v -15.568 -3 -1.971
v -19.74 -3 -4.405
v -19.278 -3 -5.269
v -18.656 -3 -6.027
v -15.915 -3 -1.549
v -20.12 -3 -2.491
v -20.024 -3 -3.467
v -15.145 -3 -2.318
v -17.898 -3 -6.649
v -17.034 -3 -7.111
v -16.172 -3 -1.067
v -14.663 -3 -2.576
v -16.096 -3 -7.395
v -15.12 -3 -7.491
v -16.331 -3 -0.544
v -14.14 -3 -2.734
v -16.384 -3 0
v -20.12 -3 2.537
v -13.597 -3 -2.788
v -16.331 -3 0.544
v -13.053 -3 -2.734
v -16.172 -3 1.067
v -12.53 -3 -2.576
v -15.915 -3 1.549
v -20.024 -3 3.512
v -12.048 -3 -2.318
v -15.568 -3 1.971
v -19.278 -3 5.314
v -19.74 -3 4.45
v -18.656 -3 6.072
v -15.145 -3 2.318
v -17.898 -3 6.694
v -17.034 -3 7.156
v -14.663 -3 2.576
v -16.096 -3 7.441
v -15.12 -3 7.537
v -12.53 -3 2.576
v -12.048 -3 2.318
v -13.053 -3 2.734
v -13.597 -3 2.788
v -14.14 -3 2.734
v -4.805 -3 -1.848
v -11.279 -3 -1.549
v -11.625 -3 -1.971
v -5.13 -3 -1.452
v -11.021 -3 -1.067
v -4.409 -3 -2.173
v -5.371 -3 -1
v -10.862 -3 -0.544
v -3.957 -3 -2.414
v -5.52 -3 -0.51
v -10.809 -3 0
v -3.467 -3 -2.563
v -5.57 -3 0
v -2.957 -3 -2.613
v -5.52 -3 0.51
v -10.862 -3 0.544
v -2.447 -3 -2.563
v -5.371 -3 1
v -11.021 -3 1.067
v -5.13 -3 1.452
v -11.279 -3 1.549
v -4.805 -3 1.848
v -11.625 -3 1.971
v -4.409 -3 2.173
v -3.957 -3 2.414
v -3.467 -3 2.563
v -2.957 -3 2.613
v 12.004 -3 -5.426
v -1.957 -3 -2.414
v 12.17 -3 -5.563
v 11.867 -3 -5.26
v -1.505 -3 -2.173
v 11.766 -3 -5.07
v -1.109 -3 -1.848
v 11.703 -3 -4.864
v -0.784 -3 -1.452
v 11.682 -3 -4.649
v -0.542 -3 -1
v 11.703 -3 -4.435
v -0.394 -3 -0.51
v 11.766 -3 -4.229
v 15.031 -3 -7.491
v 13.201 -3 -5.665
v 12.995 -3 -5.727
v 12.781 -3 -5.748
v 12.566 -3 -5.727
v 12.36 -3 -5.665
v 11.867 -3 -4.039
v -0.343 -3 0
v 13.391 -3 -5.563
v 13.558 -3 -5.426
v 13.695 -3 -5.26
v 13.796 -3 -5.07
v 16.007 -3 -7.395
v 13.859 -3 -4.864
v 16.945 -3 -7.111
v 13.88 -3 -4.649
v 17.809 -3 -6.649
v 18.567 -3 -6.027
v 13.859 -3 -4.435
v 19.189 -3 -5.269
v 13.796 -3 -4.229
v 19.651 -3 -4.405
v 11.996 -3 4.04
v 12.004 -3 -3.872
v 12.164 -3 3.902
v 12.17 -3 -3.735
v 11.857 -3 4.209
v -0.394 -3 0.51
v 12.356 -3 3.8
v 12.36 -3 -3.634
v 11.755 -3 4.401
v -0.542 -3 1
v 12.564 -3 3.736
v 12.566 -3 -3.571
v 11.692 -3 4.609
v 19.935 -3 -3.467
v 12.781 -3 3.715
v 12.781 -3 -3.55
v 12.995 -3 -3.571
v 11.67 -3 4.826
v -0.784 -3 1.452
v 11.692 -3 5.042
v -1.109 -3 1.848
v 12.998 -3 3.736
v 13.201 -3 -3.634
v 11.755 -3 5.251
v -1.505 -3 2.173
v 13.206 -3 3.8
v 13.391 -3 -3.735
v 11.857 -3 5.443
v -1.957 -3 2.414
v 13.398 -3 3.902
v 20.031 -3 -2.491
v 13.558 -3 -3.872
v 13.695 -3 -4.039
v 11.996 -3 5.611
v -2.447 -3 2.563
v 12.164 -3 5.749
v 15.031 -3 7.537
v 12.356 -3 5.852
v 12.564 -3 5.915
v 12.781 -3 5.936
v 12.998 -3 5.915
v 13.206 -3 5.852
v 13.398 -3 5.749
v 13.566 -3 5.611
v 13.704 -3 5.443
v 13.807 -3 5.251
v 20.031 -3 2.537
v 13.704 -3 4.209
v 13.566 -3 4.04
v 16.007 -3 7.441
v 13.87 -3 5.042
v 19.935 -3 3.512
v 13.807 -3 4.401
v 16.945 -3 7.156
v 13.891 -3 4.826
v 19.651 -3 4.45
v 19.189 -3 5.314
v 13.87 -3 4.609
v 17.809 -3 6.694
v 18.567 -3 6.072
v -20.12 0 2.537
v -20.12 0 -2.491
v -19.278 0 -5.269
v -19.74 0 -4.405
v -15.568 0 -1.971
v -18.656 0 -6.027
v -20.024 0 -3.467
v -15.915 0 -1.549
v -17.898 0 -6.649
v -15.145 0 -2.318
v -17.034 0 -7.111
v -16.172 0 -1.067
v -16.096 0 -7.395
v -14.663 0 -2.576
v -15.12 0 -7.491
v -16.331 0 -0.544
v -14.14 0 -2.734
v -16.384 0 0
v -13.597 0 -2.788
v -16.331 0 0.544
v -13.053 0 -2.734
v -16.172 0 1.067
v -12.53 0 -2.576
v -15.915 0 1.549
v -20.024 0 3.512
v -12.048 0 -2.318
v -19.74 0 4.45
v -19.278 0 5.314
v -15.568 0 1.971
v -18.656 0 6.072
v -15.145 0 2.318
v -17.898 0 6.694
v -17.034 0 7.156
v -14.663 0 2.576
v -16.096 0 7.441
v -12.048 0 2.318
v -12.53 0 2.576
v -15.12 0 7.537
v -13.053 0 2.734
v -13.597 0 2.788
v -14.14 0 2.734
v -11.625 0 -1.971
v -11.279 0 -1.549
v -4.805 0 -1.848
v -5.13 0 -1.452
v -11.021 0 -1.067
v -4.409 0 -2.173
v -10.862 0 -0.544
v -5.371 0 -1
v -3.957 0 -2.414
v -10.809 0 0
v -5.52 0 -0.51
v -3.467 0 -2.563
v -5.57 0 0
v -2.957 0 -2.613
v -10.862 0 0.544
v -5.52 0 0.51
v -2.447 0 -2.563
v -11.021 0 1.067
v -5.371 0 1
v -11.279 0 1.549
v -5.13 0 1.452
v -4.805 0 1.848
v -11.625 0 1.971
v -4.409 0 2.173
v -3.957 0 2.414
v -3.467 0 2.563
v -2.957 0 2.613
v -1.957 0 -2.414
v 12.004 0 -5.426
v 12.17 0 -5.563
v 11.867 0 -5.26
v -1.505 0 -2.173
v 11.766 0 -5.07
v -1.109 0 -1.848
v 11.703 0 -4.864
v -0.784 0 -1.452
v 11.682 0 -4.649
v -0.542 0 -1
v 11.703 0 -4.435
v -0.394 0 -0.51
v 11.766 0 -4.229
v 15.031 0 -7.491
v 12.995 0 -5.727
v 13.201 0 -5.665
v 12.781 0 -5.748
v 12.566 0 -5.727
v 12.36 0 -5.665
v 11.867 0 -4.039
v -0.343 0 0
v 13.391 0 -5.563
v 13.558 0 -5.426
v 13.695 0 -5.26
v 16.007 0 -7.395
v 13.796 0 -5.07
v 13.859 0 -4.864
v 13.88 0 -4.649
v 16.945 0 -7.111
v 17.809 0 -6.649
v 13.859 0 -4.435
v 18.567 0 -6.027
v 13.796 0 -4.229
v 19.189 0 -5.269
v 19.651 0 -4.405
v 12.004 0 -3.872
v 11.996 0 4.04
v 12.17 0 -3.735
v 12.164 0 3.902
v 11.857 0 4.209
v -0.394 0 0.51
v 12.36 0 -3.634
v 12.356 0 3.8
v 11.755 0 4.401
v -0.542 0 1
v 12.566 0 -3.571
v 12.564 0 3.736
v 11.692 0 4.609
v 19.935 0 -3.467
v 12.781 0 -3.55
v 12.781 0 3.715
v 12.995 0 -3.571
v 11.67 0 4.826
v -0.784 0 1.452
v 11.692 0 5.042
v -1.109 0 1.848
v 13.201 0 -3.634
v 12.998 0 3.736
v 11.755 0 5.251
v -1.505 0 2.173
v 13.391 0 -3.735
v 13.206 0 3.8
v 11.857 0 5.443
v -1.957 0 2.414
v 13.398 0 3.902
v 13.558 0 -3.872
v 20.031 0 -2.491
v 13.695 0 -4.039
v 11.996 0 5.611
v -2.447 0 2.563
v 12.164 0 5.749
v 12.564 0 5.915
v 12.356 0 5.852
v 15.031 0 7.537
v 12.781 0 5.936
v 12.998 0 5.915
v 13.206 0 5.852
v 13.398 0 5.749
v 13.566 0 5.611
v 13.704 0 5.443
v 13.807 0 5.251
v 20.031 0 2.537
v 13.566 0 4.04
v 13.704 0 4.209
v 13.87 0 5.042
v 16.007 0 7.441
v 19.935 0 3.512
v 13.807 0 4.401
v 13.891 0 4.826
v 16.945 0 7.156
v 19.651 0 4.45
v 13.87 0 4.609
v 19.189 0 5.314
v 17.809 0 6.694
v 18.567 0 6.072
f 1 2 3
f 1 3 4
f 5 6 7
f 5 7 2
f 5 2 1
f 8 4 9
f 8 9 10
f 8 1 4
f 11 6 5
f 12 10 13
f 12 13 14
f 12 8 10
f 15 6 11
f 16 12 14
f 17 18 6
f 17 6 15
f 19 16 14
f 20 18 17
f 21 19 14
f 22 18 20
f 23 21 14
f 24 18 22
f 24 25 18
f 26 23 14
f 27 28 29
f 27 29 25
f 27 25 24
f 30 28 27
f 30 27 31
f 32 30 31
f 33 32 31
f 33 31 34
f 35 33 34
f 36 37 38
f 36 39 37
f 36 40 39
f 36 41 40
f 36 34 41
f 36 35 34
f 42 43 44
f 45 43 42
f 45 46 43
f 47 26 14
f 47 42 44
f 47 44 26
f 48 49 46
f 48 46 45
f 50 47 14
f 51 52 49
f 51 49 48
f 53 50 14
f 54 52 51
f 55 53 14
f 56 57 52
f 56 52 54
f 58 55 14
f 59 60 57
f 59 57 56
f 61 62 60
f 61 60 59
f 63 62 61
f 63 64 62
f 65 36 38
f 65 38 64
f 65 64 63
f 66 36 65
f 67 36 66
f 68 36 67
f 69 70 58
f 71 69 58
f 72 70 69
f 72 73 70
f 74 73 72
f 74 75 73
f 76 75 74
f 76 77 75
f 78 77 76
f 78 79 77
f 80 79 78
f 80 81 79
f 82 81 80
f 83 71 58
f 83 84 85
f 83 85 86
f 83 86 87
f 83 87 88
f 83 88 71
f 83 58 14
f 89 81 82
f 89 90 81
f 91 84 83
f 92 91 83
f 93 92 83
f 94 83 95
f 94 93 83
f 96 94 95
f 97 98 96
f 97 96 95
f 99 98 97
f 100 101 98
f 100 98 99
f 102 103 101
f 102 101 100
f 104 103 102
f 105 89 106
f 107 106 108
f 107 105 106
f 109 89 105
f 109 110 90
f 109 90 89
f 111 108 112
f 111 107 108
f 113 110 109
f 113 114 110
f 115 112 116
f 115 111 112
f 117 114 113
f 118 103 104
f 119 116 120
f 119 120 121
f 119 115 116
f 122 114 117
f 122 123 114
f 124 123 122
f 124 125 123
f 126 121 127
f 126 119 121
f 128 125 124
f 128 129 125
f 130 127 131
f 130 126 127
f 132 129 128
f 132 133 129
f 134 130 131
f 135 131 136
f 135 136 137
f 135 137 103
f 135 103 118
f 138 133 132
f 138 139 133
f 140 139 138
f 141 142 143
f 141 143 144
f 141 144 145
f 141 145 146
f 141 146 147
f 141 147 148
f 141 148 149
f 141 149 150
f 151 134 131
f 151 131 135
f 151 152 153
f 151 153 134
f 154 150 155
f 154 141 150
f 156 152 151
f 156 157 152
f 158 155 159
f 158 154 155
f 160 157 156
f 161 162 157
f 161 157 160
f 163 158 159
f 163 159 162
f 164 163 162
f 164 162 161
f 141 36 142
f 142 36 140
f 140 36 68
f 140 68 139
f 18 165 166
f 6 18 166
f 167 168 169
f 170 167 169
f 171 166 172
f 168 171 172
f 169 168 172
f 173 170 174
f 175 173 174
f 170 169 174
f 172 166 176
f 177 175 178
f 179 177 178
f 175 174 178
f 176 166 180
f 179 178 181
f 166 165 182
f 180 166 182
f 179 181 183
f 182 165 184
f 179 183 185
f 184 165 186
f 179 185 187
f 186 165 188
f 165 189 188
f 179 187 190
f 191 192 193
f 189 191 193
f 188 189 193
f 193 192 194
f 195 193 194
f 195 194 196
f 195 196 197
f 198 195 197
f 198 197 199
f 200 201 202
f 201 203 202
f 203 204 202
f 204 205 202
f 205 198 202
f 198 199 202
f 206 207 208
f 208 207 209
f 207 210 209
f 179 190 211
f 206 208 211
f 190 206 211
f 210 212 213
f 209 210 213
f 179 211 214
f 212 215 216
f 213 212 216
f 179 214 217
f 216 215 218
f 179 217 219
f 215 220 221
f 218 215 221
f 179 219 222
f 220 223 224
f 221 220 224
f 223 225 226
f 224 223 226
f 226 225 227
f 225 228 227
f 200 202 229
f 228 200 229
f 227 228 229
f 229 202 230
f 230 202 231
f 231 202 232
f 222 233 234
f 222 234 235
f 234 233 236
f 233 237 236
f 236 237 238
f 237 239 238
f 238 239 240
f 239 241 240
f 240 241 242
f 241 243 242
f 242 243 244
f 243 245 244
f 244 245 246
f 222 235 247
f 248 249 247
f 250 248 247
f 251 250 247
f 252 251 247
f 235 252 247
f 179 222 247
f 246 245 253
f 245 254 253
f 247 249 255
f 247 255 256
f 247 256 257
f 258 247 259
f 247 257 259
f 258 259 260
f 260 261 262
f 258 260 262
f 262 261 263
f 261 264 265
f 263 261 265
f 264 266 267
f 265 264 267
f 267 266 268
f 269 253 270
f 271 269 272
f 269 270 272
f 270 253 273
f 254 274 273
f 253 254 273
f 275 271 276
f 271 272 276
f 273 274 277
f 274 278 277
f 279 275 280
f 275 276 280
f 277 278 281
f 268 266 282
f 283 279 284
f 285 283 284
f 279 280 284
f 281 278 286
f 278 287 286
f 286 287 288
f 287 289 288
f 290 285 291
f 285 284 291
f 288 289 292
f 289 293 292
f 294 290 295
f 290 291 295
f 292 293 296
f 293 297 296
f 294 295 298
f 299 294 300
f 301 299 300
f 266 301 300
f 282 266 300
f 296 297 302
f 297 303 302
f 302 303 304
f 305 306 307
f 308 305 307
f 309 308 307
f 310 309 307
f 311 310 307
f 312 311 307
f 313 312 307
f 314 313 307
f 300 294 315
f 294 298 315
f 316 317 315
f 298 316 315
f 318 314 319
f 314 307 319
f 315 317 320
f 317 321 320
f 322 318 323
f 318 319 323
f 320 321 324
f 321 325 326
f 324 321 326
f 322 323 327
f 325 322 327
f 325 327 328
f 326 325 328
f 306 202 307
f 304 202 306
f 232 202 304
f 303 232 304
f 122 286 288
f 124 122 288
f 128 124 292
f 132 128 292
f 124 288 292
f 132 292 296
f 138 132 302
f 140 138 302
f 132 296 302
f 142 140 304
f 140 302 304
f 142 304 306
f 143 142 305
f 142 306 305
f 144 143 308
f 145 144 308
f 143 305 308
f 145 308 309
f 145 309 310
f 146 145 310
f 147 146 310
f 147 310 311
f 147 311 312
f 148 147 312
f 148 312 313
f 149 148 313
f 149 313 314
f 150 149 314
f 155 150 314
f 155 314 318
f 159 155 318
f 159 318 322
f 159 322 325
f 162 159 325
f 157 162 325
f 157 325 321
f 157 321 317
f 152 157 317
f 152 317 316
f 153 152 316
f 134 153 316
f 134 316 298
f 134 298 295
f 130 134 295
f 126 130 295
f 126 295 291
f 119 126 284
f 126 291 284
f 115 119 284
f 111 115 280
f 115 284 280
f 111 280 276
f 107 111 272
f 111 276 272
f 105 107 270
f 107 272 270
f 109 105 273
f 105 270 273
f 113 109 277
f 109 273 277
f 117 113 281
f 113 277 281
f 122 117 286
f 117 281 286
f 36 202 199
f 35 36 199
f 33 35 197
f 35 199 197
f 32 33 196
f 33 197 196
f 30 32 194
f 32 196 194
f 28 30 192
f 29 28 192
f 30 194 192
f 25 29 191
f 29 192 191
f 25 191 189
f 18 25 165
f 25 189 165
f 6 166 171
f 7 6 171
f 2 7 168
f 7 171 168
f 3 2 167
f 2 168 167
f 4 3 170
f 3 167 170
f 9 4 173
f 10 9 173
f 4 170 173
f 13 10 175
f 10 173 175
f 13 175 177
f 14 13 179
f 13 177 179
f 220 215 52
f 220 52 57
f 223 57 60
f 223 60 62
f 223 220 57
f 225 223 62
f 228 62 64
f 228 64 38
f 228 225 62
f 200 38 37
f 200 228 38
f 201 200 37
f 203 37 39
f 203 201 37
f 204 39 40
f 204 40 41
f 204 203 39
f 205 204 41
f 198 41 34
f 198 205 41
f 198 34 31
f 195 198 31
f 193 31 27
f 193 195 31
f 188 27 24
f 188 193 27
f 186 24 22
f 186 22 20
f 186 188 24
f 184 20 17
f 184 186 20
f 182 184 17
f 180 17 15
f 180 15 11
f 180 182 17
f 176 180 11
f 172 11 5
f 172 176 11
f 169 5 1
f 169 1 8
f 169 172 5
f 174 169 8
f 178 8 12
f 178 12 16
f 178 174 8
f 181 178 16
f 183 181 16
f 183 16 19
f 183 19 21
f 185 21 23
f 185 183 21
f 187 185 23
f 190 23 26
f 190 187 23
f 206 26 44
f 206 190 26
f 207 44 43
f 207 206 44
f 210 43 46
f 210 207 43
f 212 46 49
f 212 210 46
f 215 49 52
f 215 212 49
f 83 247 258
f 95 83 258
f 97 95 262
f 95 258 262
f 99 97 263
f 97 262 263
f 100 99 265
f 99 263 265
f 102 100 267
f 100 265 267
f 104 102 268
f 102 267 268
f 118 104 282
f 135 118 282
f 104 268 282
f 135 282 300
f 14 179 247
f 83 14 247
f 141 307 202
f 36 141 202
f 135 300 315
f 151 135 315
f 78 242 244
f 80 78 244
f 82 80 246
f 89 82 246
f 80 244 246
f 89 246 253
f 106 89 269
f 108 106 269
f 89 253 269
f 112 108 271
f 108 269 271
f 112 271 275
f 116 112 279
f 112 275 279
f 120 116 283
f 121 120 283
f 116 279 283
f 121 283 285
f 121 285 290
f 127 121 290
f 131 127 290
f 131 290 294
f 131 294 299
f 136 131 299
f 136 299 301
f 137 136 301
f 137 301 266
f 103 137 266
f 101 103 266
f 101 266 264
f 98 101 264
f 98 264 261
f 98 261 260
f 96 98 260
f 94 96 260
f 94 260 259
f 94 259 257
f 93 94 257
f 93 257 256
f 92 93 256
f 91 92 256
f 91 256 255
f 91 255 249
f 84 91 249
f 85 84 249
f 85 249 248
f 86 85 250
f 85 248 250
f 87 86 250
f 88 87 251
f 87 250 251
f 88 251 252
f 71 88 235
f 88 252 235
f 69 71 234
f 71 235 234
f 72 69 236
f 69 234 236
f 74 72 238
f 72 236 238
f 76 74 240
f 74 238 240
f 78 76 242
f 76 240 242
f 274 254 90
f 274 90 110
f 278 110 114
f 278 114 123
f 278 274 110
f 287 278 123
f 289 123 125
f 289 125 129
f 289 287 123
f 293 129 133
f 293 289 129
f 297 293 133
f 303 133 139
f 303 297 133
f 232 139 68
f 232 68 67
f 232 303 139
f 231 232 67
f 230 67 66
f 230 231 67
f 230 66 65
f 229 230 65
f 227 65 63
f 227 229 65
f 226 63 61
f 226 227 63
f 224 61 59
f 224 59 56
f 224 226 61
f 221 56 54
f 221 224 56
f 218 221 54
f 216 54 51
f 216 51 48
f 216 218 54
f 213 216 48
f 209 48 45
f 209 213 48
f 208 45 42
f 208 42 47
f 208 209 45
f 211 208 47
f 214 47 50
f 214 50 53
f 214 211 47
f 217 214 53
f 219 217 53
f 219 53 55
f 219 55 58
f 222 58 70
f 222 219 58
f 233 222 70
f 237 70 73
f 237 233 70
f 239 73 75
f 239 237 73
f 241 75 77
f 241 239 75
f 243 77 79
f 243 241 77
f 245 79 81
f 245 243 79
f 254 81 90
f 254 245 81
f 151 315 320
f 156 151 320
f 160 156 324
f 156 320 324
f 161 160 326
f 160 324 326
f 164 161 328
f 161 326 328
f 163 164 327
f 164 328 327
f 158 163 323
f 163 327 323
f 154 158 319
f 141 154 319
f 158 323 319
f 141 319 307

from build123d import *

# Parameters (mm, degrees)
F0_R     = 2.787797
F0_R_2   = 2.613336
F1_DEPTH = 3
F2_R     = 1.110605
F2_R_2   = 1.099003
F3_DEPTH = 25


with BuildPart() as f1:
    # F0 (on Front) → F1 (new body)
    with BuildSketch(Plane.XZ):
        with BuildLine():
            Line((15.031415, 7.53661), (-15.120215, 7.53661))
            ThreePointArc((-15.120215, 7.53661), (-18.655749, 6.072144), (-20.120215, 2.53661))
            Line((-20.120215, 2.53661), (-20.120215, -2.491496))
            ThreePointArc((-20.120215, -2.491496), (-18.655749, -6.02703), (-15.120215, -7.491496))
            Line((-15.120215, -7.491496), (15.031415, -7.491496))
            ThreePointArc((15.031415, -7.491496), (18.566949, -6.02703), (20.031415, -2.491496))
            Line((20.031415, -2.491496), (20.031415, 2.53661))
            ThreePointArc((20.031415, 2.53661), (18.566949, 6.072144), (15.031415, 7.53661))
        make_face()
        with Locations((-13.596544, 0)):
            Circle(F0_R, mode=Mode.SUBTRACT)
        with Locations((-2.956751, 0)):
            Circle(F0_R_2, mode=Mode.SUBTRACT)
    extrude(amount=F1_DEPTH)

    # F2 (on face) → F3 (cut)
    with BuildSketch(Plane(origin=(0, 0, 0), x_dir=(-1, 0, 0), z_dir=(0, 1, 0))):
        with Locations((-12.780892, 4.825667)):
            Circle(F2_R)
        with Locations((-12.780892, -4.649186)):
            Circle(F2_R_2)
    extrude(amount=-F3_DEPTH, mode=Mode.SUBTRACT)


solid = f1.part
